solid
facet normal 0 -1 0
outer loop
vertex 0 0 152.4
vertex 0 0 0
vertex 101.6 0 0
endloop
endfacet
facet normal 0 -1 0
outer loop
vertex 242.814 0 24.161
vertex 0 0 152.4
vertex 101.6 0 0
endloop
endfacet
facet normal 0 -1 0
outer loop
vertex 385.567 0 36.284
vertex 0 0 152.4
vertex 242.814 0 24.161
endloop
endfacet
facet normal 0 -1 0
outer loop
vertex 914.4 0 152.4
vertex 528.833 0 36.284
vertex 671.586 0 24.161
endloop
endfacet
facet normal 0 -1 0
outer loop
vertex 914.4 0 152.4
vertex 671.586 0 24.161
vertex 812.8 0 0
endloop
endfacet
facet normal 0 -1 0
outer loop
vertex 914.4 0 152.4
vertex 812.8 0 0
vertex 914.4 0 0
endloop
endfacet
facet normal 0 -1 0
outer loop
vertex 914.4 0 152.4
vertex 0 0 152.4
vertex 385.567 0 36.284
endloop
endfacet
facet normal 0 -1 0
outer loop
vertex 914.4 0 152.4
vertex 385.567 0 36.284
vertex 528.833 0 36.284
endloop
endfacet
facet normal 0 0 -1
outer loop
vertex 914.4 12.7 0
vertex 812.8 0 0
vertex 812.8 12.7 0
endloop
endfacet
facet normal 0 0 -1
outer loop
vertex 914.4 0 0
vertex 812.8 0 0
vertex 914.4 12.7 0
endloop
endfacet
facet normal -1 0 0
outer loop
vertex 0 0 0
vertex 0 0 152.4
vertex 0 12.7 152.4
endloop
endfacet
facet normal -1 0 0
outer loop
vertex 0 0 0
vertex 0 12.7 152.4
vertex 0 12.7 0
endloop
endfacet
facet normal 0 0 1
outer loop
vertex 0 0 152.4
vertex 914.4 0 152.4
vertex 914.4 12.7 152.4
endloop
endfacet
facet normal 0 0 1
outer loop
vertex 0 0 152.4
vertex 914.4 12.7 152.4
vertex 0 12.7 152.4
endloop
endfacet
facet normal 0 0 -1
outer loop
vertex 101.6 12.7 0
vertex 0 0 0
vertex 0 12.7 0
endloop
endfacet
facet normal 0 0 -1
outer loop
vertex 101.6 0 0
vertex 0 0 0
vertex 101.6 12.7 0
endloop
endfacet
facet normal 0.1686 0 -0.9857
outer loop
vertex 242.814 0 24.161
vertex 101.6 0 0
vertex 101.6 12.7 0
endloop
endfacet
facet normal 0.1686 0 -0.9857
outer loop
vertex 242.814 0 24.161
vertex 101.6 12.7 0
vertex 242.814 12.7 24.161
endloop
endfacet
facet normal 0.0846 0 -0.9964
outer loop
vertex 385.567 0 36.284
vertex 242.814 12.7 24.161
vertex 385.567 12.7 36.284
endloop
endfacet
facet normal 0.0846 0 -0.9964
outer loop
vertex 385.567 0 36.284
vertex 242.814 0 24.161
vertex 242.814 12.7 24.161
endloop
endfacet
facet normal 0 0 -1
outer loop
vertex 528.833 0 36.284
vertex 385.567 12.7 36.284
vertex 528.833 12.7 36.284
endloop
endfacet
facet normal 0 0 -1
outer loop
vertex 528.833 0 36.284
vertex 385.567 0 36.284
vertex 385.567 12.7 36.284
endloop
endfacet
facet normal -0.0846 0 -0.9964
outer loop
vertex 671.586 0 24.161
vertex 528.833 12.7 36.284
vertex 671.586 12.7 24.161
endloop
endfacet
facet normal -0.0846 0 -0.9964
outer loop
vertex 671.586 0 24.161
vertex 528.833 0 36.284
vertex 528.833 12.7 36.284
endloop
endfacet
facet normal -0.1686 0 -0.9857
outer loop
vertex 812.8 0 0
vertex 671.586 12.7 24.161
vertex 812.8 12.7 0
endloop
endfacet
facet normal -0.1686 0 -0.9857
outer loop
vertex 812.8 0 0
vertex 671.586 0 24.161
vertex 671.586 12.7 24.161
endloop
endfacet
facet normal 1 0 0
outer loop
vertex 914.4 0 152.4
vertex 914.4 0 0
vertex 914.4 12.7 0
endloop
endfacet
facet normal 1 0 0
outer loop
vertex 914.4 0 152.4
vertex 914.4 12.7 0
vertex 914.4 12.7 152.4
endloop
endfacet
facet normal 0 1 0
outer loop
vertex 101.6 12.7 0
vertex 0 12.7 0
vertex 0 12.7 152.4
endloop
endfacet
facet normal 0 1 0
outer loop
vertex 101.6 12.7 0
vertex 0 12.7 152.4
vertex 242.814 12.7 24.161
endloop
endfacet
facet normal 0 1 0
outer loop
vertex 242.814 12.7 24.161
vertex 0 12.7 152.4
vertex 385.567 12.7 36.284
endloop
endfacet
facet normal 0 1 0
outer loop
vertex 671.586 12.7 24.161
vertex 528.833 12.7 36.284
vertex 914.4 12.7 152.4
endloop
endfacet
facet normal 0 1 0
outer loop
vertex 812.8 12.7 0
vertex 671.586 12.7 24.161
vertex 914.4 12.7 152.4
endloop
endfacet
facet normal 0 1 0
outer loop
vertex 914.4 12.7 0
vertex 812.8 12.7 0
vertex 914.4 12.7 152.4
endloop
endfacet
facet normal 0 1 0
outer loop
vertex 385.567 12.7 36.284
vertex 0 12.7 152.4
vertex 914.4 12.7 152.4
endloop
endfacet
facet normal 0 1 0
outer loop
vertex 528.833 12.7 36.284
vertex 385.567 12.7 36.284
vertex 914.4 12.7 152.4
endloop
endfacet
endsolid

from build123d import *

# Parameters (mm, degrees)
F1_DEPTH = 12.7


with BuildPart() as f1:
    # F0 (on Front) → F1 (new body)
    with BuildSketch(Plane.XZ):
        with BuildLine():
            Line((0, 152.4), (0, 0))
            Line((0, 0), (101.6, 0))
            ThreePointArc((101.6, 0), (457.2, 37.801961), (812.8, 0))
            Line((812.8, 0), (914.4, 0))
            Line((914.4, 0), (914.4, 152.4))
            Line((914.4, 152.4), (0, 152.4))
        make_face()
    extrude(amount=-F1_DEPTH)


solid = f1.part
